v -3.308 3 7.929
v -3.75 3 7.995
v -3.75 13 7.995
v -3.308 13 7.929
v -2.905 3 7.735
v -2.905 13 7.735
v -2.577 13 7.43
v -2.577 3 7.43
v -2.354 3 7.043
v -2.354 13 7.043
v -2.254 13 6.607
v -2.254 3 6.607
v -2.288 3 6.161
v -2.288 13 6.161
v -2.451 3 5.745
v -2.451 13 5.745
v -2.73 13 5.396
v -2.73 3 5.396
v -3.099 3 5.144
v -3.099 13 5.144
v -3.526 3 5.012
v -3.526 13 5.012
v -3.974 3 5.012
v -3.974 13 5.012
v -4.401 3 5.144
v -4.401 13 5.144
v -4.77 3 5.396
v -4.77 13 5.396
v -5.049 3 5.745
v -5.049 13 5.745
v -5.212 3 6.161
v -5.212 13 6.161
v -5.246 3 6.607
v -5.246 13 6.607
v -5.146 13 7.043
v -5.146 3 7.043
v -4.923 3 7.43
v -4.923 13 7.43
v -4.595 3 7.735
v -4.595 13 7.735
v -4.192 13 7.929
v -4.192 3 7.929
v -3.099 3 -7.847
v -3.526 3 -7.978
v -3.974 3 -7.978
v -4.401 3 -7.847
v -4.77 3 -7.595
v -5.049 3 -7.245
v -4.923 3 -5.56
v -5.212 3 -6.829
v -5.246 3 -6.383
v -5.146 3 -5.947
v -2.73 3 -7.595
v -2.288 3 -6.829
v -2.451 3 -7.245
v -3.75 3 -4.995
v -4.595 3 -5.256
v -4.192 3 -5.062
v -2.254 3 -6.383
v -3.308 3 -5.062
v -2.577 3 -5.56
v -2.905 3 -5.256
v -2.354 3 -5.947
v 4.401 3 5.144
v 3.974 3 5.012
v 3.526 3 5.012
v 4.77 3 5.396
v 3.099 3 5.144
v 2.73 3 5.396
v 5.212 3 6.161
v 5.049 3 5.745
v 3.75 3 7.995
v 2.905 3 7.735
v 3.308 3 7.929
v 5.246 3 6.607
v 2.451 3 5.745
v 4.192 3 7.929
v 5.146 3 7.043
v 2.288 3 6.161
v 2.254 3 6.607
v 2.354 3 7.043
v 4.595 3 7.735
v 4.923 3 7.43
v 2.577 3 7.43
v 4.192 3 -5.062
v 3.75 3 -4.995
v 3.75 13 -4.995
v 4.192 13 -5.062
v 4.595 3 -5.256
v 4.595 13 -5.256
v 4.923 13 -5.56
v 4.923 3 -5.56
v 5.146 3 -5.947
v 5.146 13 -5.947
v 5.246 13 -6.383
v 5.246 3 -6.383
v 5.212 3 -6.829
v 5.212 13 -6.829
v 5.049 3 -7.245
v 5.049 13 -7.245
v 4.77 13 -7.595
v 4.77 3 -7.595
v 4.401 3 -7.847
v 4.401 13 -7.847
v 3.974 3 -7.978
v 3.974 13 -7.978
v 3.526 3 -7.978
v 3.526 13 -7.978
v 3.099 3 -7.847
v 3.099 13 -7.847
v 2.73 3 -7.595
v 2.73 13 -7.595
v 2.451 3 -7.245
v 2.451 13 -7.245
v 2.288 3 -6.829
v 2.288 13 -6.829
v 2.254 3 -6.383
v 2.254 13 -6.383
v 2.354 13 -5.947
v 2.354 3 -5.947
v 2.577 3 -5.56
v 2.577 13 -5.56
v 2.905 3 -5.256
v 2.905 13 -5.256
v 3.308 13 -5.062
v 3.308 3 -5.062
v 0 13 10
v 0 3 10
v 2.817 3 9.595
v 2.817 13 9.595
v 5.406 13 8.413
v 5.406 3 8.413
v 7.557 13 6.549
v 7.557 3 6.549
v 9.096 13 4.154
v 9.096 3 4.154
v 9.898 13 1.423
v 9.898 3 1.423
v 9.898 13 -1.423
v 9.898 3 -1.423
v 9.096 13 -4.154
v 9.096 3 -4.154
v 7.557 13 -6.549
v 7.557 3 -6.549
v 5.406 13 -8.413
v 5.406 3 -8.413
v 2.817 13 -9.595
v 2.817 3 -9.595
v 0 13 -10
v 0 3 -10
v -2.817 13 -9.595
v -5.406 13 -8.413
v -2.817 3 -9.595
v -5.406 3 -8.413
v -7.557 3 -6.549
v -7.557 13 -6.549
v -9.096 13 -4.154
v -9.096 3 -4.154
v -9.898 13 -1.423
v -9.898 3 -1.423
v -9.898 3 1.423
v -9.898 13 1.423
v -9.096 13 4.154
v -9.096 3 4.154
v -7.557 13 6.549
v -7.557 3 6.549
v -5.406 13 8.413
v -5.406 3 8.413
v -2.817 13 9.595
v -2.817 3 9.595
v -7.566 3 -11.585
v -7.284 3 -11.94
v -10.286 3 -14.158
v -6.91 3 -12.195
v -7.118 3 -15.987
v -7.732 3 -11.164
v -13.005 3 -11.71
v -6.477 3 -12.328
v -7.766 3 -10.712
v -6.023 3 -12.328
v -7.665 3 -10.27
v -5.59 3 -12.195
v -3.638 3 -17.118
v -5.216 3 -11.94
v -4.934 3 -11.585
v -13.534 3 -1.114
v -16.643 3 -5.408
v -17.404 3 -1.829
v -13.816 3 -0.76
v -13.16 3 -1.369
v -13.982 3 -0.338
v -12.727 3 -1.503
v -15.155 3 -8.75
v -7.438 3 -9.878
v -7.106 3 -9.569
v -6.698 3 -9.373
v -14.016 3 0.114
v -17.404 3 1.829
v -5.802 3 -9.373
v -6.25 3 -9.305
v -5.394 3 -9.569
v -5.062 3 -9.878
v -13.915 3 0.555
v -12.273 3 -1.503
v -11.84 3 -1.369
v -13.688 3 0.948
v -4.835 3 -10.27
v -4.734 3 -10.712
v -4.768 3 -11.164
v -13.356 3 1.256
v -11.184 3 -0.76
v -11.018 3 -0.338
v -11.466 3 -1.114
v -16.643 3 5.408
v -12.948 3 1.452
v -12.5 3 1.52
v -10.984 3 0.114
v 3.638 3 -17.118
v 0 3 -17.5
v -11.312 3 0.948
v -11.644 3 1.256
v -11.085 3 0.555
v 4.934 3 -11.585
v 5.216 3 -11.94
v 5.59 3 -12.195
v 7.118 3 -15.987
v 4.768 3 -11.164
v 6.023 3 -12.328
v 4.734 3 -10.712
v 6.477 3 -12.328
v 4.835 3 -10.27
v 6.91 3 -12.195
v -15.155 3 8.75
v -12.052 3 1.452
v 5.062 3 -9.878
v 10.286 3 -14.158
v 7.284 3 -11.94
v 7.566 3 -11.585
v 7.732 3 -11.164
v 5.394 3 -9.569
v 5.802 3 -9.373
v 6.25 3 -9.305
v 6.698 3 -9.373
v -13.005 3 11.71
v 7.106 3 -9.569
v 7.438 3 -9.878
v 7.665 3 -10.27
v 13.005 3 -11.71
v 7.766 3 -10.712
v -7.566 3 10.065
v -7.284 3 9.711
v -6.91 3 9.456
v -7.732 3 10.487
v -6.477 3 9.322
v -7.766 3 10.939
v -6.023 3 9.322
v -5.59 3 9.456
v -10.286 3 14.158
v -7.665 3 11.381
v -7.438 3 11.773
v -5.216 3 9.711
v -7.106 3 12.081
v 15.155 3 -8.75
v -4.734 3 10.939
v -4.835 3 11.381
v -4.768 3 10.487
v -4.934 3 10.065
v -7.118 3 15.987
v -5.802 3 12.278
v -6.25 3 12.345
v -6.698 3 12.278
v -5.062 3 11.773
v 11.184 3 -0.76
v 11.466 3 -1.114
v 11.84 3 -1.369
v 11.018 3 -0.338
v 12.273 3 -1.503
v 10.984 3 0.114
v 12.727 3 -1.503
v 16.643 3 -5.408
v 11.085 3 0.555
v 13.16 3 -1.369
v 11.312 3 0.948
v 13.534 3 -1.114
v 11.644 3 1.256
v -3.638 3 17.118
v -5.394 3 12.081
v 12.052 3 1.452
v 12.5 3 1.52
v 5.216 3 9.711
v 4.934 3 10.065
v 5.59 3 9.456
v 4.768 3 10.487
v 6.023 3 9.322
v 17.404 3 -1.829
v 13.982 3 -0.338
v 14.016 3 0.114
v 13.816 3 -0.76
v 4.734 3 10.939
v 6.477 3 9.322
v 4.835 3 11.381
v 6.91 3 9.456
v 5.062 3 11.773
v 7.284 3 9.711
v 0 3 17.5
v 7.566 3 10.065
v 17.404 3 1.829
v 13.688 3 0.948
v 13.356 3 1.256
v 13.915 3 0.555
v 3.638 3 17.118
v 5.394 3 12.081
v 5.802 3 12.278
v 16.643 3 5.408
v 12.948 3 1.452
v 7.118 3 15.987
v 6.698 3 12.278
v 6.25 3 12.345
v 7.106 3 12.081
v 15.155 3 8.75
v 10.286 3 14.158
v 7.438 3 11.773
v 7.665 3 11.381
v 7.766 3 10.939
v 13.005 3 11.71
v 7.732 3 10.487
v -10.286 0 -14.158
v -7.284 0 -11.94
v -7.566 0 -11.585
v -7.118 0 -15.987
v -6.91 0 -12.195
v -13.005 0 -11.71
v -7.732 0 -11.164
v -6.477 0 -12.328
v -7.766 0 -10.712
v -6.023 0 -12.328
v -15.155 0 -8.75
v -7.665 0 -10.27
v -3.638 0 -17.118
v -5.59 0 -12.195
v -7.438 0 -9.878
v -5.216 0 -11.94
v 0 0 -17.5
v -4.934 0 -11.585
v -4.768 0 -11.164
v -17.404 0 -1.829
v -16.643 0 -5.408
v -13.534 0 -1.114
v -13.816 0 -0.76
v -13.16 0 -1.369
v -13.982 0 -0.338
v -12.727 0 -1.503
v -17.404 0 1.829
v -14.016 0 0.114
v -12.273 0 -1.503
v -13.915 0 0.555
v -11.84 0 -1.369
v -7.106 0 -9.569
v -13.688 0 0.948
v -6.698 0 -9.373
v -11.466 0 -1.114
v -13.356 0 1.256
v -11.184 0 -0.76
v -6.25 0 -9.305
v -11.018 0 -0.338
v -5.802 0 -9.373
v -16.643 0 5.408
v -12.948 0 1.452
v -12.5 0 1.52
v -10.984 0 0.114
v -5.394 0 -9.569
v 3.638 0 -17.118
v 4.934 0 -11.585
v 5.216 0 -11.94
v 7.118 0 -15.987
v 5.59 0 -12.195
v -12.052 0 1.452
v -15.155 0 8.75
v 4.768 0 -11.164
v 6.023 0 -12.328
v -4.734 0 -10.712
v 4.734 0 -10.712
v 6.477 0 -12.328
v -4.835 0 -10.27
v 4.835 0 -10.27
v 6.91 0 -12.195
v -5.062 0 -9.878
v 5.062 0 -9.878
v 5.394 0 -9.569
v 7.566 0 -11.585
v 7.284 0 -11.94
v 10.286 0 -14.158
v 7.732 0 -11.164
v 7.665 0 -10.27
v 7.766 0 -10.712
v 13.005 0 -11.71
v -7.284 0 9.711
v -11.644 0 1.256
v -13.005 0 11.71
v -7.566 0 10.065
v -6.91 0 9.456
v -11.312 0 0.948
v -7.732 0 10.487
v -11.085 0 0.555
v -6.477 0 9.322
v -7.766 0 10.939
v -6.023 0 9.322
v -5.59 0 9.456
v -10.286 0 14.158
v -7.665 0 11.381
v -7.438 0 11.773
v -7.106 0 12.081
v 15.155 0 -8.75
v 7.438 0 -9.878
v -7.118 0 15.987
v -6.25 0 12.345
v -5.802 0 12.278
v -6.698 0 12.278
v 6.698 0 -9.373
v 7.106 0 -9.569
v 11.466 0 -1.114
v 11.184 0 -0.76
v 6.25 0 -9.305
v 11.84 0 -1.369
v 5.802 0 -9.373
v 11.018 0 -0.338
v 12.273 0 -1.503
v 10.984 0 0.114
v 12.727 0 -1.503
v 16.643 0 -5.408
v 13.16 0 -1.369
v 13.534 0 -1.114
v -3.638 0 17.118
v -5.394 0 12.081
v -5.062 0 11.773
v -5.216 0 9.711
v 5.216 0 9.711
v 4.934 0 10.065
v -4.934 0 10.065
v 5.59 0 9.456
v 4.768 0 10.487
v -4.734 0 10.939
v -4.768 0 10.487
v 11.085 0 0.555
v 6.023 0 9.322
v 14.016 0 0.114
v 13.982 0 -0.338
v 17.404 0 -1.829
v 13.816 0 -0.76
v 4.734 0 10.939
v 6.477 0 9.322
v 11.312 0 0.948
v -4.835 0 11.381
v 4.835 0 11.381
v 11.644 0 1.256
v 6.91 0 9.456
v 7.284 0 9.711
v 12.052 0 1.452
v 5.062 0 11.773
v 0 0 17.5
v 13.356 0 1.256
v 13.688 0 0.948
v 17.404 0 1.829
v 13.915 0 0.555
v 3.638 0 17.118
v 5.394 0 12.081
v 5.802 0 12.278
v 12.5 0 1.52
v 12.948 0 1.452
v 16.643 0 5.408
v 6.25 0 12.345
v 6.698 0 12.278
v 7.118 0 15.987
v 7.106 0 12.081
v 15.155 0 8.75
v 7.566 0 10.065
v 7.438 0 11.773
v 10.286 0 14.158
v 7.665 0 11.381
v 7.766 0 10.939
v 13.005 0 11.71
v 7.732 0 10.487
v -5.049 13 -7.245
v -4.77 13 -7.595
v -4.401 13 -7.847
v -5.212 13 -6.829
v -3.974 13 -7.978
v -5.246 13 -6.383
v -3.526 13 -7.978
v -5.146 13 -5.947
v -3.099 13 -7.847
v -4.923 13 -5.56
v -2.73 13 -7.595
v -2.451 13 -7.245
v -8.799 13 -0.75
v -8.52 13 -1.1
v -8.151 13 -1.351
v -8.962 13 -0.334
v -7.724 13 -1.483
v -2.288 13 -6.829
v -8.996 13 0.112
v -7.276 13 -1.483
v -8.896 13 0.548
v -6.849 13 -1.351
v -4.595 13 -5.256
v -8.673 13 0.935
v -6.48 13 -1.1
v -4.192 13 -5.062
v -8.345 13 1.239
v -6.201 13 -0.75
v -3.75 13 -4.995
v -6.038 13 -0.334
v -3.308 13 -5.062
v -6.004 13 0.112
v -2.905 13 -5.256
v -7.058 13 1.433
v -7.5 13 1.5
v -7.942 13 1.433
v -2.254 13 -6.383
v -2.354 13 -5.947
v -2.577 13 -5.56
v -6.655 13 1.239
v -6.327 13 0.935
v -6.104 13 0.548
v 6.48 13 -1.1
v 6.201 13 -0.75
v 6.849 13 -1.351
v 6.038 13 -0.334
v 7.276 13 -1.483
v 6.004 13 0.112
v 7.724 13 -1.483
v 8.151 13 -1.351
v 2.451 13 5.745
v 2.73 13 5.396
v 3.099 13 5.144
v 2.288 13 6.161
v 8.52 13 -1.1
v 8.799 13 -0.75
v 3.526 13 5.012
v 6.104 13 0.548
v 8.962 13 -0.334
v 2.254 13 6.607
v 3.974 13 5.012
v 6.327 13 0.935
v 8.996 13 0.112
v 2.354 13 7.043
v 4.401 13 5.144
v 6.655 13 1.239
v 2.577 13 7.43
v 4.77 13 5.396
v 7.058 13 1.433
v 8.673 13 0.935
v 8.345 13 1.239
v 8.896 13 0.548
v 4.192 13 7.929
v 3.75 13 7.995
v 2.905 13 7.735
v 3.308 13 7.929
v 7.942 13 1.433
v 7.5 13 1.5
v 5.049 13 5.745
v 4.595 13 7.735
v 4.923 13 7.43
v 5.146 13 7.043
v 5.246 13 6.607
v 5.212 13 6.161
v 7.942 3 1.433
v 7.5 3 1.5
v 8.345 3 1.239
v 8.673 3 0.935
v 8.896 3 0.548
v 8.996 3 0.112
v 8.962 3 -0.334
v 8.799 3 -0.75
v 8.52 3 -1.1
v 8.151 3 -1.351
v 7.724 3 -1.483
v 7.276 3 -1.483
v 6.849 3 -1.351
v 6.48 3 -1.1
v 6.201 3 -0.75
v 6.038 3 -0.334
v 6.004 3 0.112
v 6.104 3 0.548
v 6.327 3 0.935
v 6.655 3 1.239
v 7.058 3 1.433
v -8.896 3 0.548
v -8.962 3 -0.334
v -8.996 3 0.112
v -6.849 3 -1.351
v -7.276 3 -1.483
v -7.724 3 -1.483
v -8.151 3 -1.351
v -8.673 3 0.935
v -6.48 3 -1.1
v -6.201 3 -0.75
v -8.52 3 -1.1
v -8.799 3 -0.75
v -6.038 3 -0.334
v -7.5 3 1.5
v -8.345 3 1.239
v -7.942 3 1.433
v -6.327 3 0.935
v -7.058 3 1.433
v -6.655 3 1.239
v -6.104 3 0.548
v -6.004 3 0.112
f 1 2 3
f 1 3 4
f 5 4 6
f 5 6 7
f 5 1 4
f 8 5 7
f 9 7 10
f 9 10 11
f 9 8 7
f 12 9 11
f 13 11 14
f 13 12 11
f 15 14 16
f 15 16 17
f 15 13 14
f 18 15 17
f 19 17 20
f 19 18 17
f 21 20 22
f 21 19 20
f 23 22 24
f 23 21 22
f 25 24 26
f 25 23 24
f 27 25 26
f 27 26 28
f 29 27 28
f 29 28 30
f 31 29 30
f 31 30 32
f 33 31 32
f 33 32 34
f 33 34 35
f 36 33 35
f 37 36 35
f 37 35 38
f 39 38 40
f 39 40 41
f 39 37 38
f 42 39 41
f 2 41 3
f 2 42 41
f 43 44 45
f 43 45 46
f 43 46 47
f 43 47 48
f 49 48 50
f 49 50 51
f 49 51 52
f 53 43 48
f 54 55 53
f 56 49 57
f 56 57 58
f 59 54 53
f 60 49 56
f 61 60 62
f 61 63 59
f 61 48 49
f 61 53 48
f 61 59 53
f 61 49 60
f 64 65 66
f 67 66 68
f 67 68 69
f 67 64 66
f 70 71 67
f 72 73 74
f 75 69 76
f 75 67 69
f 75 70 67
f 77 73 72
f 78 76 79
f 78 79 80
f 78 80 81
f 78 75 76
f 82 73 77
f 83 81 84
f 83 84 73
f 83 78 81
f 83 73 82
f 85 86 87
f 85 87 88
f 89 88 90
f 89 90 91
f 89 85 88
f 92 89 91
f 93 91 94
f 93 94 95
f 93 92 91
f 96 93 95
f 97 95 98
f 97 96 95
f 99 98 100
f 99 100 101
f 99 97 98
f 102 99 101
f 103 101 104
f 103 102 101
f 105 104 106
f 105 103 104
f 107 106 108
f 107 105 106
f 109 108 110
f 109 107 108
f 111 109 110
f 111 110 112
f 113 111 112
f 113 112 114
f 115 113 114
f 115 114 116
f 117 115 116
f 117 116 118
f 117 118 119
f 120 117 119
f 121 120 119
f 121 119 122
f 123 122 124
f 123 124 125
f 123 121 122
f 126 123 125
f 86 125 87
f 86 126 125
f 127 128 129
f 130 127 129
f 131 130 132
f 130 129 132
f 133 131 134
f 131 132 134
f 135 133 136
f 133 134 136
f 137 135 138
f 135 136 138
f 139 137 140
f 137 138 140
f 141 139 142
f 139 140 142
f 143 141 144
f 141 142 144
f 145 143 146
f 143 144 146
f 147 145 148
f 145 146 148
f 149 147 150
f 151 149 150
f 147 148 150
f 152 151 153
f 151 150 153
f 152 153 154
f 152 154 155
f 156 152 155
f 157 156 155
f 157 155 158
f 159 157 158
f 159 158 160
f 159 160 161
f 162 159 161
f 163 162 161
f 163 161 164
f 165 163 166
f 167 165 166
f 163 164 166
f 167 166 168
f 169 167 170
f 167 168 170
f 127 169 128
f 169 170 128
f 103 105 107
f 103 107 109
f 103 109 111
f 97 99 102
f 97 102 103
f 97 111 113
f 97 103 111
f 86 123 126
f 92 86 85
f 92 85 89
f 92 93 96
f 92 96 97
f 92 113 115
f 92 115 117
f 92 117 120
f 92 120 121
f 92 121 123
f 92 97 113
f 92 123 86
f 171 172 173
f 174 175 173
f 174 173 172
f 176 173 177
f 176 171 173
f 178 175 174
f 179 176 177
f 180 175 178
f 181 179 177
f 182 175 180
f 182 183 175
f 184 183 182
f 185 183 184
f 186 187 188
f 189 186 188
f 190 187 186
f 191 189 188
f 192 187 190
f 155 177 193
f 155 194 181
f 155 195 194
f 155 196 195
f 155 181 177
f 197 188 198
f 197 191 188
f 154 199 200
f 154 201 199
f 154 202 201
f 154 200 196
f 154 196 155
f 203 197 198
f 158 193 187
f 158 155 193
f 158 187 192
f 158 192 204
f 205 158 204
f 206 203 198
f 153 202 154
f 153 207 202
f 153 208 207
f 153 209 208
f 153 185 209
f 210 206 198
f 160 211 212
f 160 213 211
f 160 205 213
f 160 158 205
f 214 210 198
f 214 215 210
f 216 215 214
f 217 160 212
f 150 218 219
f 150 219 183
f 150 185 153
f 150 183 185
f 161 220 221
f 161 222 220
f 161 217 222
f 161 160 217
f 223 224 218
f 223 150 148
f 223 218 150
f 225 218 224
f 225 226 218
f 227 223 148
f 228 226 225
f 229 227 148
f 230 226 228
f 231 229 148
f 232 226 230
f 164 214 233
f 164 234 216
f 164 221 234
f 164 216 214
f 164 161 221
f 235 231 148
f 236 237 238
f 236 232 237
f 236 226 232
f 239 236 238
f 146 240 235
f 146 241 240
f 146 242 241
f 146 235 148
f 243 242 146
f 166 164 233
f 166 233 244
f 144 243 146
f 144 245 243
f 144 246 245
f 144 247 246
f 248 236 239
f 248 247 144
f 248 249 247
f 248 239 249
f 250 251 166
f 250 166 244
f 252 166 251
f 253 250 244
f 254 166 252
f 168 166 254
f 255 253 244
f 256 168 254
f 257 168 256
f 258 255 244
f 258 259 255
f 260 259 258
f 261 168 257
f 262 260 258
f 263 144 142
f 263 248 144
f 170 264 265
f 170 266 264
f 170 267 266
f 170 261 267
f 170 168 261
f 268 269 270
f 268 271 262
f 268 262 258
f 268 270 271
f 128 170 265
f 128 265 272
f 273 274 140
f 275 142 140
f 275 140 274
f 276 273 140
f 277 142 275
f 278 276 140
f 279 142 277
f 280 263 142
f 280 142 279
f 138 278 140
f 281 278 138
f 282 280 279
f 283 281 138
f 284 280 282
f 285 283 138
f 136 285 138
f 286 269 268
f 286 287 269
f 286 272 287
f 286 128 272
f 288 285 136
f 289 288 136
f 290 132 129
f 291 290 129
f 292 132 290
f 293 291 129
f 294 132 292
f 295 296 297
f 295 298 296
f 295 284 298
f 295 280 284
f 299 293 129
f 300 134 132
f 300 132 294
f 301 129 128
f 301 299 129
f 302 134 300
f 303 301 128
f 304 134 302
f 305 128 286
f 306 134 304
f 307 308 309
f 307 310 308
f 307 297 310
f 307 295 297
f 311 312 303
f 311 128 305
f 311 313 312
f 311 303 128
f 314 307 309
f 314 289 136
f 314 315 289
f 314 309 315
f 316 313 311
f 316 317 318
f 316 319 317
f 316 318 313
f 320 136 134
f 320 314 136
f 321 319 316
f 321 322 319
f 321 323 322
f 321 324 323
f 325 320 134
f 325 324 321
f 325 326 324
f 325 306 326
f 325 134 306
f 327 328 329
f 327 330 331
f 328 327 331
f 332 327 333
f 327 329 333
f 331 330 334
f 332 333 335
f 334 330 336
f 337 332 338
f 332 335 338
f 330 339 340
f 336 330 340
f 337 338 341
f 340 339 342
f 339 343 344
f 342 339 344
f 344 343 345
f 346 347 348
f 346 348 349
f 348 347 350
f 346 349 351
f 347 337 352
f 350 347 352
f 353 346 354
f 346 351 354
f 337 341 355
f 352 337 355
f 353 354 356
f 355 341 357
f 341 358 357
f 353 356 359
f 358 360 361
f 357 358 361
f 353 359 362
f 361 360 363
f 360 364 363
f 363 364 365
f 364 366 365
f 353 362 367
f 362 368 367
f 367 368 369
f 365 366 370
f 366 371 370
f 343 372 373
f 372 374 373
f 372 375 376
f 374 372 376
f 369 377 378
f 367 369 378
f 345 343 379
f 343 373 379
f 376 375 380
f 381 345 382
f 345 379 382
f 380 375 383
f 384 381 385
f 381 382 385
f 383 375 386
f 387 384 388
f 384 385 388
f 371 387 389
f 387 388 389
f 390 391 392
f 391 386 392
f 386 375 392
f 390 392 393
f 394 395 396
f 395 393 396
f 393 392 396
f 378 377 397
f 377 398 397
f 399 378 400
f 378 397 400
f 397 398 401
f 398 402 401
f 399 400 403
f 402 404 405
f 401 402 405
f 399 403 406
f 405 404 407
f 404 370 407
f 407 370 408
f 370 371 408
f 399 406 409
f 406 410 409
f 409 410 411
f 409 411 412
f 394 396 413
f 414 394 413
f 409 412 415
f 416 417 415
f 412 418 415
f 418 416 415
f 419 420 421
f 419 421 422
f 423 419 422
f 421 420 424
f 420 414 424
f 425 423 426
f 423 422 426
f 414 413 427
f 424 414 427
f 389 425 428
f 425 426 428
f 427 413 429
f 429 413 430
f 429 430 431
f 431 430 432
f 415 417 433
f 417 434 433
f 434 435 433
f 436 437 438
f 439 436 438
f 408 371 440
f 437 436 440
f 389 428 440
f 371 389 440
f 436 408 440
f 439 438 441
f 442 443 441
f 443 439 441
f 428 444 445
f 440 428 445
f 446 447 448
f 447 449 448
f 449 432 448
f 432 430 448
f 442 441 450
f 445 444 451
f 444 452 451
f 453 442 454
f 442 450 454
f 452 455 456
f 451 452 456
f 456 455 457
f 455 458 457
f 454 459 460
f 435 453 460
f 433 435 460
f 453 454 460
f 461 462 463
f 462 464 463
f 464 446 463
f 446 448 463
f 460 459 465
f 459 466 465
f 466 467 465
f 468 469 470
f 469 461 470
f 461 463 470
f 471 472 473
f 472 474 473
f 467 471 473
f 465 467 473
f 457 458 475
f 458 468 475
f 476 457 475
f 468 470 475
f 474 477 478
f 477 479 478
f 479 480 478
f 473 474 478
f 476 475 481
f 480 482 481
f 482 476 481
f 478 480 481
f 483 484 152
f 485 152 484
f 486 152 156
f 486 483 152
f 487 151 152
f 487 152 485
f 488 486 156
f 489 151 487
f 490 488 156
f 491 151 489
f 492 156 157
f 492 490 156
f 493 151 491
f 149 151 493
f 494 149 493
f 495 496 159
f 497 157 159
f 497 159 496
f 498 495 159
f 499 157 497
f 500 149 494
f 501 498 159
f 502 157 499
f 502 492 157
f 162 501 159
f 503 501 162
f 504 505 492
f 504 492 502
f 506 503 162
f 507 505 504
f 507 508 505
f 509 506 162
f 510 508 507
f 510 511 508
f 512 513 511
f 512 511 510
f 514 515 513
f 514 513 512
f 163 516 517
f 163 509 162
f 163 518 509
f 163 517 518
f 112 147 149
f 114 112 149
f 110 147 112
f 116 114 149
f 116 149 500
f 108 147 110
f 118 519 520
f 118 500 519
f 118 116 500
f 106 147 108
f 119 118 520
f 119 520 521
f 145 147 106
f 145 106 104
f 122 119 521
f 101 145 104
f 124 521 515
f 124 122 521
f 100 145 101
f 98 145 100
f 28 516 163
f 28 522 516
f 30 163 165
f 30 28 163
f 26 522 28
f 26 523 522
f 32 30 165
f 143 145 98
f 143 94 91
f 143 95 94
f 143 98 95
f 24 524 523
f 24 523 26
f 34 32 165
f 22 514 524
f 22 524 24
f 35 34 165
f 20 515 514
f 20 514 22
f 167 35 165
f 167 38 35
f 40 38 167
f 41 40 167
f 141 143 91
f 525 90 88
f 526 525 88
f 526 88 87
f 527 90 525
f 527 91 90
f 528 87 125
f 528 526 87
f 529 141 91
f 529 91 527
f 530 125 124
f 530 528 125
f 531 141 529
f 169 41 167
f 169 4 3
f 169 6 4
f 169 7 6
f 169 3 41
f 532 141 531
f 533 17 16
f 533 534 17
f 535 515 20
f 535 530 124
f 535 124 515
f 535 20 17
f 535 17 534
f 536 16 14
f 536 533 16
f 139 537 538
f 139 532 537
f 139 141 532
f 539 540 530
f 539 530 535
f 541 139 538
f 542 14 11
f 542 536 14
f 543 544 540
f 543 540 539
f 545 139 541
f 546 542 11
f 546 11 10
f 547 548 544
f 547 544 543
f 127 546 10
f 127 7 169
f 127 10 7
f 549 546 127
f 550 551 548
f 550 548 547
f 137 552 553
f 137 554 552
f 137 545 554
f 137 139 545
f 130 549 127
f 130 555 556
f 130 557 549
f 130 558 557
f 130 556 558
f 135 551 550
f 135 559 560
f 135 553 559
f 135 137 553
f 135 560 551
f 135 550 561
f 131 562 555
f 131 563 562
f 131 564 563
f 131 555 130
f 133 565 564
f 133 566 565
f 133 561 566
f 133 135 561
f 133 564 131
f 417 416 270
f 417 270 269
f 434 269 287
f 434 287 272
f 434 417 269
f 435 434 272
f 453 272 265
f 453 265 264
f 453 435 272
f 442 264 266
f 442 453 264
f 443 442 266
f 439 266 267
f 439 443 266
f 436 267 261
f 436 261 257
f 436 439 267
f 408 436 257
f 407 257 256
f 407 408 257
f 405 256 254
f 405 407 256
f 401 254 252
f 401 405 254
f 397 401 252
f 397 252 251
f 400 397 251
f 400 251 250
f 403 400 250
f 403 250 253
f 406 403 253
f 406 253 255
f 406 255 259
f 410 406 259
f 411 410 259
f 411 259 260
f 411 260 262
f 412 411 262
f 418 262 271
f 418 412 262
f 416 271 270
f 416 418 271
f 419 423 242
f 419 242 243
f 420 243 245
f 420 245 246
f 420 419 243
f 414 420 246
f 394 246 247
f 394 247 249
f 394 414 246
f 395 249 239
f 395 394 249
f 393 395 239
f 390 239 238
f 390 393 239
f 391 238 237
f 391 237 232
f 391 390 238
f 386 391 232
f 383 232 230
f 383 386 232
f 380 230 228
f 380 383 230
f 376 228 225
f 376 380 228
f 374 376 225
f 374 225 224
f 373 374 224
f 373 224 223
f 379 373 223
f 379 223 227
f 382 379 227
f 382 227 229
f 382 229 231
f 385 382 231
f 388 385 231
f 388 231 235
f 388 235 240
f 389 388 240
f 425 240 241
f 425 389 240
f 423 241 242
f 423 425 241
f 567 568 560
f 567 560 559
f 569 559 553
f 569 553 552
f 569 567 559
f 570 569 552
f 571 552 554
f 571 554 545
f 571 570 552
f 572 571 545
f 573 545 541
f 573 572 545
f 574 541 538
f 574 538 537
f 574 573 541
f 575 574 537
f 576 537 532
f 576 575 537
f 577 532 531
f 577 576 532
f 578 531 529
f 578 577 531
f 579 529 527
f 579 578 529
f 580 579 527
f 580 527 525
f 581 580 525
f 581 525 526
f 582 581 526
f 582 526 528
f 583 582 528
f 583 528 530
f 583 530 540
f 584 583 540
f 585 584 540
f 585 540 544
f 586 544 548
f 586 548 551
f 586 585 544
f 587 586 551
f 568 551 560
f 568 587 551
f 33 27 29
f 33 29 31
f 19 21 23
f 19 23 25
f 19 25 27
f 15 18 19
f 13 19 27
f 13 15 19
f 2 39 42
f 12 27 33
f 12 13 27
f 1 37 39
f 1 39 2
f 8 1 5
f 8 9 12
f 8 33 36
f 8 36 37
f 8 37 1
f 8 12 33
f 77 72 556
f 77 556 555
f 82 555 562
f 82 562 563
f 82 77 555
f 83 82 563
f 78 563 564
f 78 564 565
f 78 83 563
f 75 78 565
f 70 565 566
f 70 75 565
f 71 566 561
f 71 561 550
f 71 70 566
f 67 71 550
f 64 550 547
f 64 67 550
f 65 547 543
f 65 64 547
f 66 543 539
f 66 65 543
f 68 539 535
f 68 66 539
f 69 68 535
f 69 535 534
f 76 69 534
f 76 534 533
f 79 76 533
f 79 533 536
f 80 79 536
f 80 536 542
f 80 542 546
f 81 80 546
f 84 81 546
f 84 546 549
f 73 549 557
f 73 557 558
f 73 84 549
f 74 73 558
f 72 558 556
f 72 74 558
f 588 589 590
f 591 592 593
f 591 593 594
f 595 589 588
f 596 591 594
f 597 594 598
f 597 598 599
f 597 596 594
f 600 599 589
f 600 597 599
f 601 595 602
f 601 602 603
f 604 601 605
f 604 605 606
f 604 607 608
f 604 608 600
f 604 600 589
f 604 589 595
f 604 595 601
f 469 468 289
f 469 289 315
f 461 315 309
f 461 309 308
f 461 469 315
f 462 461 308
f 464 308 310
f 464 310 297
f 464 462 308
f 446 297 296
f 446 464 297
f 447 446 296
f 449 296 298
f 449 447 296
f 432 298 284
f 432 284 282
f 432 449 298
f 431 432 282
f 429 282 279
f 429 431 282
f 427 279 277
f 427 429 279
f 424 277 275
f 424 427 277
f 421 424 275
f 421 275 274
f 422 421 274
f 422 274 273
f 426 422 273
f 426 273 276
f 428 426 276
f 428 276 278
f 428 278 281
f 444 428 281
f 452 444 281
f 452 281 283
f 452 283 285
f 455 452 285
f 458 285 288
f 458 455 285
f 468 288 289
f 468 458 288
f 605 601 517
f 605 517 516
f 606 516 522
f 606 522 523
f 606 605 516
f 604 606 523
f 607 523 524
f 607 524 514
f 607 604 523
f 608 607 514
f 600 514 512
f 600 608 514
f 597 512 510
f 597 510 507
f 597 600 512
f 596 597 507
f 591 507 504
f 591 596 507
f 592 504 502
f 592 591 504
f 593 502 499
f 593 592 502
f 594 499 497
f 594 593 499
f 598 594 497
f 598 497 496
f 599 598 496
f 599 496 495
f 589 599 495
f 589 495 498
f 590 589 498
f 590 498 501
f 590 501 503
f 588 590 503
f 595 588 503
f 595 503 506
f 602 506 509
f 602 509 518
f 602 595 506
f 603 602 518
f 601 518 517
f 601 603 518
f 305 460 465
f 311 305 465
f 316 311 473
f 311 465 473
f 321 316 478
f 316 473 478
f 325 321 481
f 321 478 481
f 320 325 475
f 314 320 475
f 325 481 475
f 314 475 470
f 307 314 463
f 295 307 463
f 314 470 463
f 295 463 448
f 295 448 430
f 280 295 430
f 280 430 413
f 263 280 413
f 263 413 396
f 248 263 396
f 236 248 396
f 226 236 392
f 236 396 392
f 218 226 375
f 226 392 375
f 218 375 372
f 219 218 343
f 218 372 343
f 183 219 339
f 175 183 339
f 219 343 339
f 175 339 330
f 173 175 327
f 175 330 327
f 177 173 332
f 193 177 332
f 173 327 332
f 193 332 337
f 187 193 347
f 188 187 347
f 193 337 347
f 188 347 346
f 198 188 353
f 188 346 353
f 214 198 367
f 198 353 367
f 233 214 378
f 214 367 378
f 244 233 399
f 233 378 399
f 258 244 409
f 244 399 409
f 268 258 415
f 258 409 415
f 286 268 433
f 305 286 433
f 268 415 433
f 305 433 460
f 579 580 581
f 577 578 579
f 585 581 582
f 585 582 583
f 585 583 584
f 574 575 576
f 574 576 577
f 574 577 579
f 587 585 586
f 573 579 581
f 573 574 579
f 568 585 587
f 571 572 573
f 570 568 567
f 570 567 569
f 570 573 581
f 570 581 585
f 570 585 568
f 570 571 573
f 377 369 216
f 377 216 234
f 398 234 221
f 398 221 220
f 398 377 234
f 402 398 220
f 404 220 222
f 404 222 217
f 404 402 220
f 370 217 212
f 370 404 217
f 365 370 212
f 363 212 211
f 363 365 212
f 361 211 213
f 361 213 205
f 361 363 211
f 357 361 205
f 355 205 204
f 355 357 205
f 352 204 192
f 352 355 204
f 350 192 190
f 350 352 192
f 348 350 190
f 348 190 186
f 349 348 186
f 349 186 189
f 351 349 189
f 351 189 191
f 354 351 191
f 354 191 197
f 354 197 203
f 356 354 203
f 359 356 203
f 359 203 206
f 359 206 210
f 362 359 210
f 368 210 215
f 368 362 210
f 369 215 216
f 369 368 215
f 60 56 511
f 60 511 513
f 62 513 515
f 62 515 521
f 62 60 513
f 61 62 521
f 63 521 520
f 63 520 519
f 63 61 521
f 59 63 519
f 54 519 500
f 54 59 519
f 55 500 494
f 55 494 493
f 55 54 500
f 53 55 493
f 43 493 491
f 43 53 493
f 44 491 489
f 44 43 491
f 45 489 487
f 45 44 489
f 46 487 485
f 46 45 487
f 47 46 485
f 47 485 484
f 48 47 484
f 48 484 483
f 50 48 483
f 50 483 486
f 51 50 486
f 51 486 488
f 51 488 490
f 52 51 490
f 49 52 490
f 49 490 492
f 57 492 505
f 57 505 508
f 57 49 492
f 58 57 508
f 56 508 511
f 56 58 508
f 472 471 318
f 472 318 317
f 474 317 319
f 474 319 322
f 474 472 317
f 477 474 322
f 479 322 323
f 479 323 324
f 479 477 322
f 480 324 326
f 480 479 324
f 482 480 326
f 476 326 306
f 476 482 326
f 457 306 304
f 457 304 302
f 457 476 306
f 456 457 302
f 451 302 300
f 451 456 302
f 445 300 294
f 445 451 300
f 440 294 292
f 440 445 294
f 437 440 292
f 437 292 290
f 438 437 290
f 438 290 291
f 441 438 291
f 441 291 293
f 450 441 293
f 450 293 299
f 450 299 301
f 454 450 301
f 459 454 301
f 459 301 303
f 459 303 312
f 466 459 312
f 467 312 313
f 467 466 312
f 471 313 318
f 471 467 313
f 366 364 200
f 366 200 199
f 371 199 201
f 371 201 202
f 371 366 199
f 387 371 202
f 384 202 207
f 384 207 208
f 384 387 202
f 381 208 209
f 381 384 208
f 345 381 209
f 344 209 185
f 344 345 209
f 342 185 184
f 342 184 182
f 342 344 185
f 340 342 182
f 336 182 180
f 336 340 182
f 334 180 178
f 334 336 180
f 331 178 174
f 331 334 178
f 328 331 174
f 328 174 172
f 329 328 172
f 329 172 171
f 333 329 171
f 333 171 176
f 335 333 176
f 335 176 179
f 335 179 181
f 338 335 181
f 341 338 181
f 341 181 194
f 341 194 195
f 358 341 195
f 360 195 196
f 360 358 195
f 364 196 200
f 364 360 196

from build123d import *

# Parameters (mm, degrees)
CROQUIS1_R              = 17.5
CROQUIS1_R_2            = 1.52
SALIENTE_EXTRUIR1_DEPTH = 3
CROQUIS2_R              = 10
CROQUIS2_R_2            = 1.5
SALIENTE_EXTRUIR2_DEPTH = 10


with BuildPart() as part:
    # Croquis1 → Saliente-Extruir1 (new body)
    with BuildSketch(Plane(origin=(0, 0, 0), x_dir=(1, 0, 0), z_dir=(0, 1, 0))):
        with Locations(Location((0, 0, 0), (0, 0, 270))):
            Circle(CROQUIS1_R)
        with Locations(Location((12.5, 0, 0), (0, 0, 270))):
            Circle(CROQUIS1_R_2, mode=Mode.SUBTRACT)
        with Locations(Location((6.25, -10.825317547, 0), (0, 0, 270))):
            Circle(CROQUIS1_R_2, mode=Mode.SUBTRACT)
        with Locations(Location((-6.25, -10.825317547, 0), (0, 0, 270))):
            Circle(CROQUIS1_R_2, mode=Mode.SUBTRACT)
        with Locations(Location((-12.5, 0, 0), (0, 0, 270))):
            Circle(CROQUIS1_R_2, mode=Mode.SUBTRACT)
        with Locations(Location((-6.25, 10.825317547, 0), (0, 0, 270))):
            Circle(CROQUIS1_R_2, mode=Mode.SUBTRACT)
        with Locations(Location((6.25, 10.825317547, 0), (0, 0, 270))):
            Circle(CROQUIS1_R_2, mode=Mode.SUBTRACT)
    extrude(amount=SALIENTE_EXTRUIR1_DEPTH)

    # Croquis2 → Saliente-Extruir2 (add)
    with BuildSketch(Plane(origin=(0, 3, 0), x_dir=(1, 0, 0), z_dir=(0, 1, 0))):
        with Locations(Location((0, 0, 0), (0, 0, 270))):
            Circle(CROQUIS2_R)
        with Locations(Location((7.5, 0, 0), (0, 0, 270))):
            Circle(CROQUIS2_R_2, mode=Mode.SUBTRACT)
        with Locations(Location((3.75, -6.495190528, 0), (0, 0, 270))):
            Circle(CROQUIS2_R_2, mode=Mode.SUBTRACT)
        with Locations(Location((-3.75, -6.495190528, 0), (0, 0, 270))):
            Circle(CROQUIS2_R_2, mode=Mode.SUBTRACT)
        with Locations(Location((-7.5, 0, 0), (0, 0, 270))):
            Circle(CROQUIS2_R_2, mode=Mode.SUBTRACT)
        with Locations(Location((-3.75, 6.495190528, 0), (0, 0, 270))):
            Circle(CROQUIS2_R_2, mode=Mode.SUBTRACT)
        with Locations(Location((3.75, 6.495190528, 0), (0, 0, 270))):
            Circle(CROQUIS2_R_2, mode=Mode.SUBTRACT)
    extrude(amount=SALIENTE_EXTRUIR2_DEPTH)


solid = part.part
